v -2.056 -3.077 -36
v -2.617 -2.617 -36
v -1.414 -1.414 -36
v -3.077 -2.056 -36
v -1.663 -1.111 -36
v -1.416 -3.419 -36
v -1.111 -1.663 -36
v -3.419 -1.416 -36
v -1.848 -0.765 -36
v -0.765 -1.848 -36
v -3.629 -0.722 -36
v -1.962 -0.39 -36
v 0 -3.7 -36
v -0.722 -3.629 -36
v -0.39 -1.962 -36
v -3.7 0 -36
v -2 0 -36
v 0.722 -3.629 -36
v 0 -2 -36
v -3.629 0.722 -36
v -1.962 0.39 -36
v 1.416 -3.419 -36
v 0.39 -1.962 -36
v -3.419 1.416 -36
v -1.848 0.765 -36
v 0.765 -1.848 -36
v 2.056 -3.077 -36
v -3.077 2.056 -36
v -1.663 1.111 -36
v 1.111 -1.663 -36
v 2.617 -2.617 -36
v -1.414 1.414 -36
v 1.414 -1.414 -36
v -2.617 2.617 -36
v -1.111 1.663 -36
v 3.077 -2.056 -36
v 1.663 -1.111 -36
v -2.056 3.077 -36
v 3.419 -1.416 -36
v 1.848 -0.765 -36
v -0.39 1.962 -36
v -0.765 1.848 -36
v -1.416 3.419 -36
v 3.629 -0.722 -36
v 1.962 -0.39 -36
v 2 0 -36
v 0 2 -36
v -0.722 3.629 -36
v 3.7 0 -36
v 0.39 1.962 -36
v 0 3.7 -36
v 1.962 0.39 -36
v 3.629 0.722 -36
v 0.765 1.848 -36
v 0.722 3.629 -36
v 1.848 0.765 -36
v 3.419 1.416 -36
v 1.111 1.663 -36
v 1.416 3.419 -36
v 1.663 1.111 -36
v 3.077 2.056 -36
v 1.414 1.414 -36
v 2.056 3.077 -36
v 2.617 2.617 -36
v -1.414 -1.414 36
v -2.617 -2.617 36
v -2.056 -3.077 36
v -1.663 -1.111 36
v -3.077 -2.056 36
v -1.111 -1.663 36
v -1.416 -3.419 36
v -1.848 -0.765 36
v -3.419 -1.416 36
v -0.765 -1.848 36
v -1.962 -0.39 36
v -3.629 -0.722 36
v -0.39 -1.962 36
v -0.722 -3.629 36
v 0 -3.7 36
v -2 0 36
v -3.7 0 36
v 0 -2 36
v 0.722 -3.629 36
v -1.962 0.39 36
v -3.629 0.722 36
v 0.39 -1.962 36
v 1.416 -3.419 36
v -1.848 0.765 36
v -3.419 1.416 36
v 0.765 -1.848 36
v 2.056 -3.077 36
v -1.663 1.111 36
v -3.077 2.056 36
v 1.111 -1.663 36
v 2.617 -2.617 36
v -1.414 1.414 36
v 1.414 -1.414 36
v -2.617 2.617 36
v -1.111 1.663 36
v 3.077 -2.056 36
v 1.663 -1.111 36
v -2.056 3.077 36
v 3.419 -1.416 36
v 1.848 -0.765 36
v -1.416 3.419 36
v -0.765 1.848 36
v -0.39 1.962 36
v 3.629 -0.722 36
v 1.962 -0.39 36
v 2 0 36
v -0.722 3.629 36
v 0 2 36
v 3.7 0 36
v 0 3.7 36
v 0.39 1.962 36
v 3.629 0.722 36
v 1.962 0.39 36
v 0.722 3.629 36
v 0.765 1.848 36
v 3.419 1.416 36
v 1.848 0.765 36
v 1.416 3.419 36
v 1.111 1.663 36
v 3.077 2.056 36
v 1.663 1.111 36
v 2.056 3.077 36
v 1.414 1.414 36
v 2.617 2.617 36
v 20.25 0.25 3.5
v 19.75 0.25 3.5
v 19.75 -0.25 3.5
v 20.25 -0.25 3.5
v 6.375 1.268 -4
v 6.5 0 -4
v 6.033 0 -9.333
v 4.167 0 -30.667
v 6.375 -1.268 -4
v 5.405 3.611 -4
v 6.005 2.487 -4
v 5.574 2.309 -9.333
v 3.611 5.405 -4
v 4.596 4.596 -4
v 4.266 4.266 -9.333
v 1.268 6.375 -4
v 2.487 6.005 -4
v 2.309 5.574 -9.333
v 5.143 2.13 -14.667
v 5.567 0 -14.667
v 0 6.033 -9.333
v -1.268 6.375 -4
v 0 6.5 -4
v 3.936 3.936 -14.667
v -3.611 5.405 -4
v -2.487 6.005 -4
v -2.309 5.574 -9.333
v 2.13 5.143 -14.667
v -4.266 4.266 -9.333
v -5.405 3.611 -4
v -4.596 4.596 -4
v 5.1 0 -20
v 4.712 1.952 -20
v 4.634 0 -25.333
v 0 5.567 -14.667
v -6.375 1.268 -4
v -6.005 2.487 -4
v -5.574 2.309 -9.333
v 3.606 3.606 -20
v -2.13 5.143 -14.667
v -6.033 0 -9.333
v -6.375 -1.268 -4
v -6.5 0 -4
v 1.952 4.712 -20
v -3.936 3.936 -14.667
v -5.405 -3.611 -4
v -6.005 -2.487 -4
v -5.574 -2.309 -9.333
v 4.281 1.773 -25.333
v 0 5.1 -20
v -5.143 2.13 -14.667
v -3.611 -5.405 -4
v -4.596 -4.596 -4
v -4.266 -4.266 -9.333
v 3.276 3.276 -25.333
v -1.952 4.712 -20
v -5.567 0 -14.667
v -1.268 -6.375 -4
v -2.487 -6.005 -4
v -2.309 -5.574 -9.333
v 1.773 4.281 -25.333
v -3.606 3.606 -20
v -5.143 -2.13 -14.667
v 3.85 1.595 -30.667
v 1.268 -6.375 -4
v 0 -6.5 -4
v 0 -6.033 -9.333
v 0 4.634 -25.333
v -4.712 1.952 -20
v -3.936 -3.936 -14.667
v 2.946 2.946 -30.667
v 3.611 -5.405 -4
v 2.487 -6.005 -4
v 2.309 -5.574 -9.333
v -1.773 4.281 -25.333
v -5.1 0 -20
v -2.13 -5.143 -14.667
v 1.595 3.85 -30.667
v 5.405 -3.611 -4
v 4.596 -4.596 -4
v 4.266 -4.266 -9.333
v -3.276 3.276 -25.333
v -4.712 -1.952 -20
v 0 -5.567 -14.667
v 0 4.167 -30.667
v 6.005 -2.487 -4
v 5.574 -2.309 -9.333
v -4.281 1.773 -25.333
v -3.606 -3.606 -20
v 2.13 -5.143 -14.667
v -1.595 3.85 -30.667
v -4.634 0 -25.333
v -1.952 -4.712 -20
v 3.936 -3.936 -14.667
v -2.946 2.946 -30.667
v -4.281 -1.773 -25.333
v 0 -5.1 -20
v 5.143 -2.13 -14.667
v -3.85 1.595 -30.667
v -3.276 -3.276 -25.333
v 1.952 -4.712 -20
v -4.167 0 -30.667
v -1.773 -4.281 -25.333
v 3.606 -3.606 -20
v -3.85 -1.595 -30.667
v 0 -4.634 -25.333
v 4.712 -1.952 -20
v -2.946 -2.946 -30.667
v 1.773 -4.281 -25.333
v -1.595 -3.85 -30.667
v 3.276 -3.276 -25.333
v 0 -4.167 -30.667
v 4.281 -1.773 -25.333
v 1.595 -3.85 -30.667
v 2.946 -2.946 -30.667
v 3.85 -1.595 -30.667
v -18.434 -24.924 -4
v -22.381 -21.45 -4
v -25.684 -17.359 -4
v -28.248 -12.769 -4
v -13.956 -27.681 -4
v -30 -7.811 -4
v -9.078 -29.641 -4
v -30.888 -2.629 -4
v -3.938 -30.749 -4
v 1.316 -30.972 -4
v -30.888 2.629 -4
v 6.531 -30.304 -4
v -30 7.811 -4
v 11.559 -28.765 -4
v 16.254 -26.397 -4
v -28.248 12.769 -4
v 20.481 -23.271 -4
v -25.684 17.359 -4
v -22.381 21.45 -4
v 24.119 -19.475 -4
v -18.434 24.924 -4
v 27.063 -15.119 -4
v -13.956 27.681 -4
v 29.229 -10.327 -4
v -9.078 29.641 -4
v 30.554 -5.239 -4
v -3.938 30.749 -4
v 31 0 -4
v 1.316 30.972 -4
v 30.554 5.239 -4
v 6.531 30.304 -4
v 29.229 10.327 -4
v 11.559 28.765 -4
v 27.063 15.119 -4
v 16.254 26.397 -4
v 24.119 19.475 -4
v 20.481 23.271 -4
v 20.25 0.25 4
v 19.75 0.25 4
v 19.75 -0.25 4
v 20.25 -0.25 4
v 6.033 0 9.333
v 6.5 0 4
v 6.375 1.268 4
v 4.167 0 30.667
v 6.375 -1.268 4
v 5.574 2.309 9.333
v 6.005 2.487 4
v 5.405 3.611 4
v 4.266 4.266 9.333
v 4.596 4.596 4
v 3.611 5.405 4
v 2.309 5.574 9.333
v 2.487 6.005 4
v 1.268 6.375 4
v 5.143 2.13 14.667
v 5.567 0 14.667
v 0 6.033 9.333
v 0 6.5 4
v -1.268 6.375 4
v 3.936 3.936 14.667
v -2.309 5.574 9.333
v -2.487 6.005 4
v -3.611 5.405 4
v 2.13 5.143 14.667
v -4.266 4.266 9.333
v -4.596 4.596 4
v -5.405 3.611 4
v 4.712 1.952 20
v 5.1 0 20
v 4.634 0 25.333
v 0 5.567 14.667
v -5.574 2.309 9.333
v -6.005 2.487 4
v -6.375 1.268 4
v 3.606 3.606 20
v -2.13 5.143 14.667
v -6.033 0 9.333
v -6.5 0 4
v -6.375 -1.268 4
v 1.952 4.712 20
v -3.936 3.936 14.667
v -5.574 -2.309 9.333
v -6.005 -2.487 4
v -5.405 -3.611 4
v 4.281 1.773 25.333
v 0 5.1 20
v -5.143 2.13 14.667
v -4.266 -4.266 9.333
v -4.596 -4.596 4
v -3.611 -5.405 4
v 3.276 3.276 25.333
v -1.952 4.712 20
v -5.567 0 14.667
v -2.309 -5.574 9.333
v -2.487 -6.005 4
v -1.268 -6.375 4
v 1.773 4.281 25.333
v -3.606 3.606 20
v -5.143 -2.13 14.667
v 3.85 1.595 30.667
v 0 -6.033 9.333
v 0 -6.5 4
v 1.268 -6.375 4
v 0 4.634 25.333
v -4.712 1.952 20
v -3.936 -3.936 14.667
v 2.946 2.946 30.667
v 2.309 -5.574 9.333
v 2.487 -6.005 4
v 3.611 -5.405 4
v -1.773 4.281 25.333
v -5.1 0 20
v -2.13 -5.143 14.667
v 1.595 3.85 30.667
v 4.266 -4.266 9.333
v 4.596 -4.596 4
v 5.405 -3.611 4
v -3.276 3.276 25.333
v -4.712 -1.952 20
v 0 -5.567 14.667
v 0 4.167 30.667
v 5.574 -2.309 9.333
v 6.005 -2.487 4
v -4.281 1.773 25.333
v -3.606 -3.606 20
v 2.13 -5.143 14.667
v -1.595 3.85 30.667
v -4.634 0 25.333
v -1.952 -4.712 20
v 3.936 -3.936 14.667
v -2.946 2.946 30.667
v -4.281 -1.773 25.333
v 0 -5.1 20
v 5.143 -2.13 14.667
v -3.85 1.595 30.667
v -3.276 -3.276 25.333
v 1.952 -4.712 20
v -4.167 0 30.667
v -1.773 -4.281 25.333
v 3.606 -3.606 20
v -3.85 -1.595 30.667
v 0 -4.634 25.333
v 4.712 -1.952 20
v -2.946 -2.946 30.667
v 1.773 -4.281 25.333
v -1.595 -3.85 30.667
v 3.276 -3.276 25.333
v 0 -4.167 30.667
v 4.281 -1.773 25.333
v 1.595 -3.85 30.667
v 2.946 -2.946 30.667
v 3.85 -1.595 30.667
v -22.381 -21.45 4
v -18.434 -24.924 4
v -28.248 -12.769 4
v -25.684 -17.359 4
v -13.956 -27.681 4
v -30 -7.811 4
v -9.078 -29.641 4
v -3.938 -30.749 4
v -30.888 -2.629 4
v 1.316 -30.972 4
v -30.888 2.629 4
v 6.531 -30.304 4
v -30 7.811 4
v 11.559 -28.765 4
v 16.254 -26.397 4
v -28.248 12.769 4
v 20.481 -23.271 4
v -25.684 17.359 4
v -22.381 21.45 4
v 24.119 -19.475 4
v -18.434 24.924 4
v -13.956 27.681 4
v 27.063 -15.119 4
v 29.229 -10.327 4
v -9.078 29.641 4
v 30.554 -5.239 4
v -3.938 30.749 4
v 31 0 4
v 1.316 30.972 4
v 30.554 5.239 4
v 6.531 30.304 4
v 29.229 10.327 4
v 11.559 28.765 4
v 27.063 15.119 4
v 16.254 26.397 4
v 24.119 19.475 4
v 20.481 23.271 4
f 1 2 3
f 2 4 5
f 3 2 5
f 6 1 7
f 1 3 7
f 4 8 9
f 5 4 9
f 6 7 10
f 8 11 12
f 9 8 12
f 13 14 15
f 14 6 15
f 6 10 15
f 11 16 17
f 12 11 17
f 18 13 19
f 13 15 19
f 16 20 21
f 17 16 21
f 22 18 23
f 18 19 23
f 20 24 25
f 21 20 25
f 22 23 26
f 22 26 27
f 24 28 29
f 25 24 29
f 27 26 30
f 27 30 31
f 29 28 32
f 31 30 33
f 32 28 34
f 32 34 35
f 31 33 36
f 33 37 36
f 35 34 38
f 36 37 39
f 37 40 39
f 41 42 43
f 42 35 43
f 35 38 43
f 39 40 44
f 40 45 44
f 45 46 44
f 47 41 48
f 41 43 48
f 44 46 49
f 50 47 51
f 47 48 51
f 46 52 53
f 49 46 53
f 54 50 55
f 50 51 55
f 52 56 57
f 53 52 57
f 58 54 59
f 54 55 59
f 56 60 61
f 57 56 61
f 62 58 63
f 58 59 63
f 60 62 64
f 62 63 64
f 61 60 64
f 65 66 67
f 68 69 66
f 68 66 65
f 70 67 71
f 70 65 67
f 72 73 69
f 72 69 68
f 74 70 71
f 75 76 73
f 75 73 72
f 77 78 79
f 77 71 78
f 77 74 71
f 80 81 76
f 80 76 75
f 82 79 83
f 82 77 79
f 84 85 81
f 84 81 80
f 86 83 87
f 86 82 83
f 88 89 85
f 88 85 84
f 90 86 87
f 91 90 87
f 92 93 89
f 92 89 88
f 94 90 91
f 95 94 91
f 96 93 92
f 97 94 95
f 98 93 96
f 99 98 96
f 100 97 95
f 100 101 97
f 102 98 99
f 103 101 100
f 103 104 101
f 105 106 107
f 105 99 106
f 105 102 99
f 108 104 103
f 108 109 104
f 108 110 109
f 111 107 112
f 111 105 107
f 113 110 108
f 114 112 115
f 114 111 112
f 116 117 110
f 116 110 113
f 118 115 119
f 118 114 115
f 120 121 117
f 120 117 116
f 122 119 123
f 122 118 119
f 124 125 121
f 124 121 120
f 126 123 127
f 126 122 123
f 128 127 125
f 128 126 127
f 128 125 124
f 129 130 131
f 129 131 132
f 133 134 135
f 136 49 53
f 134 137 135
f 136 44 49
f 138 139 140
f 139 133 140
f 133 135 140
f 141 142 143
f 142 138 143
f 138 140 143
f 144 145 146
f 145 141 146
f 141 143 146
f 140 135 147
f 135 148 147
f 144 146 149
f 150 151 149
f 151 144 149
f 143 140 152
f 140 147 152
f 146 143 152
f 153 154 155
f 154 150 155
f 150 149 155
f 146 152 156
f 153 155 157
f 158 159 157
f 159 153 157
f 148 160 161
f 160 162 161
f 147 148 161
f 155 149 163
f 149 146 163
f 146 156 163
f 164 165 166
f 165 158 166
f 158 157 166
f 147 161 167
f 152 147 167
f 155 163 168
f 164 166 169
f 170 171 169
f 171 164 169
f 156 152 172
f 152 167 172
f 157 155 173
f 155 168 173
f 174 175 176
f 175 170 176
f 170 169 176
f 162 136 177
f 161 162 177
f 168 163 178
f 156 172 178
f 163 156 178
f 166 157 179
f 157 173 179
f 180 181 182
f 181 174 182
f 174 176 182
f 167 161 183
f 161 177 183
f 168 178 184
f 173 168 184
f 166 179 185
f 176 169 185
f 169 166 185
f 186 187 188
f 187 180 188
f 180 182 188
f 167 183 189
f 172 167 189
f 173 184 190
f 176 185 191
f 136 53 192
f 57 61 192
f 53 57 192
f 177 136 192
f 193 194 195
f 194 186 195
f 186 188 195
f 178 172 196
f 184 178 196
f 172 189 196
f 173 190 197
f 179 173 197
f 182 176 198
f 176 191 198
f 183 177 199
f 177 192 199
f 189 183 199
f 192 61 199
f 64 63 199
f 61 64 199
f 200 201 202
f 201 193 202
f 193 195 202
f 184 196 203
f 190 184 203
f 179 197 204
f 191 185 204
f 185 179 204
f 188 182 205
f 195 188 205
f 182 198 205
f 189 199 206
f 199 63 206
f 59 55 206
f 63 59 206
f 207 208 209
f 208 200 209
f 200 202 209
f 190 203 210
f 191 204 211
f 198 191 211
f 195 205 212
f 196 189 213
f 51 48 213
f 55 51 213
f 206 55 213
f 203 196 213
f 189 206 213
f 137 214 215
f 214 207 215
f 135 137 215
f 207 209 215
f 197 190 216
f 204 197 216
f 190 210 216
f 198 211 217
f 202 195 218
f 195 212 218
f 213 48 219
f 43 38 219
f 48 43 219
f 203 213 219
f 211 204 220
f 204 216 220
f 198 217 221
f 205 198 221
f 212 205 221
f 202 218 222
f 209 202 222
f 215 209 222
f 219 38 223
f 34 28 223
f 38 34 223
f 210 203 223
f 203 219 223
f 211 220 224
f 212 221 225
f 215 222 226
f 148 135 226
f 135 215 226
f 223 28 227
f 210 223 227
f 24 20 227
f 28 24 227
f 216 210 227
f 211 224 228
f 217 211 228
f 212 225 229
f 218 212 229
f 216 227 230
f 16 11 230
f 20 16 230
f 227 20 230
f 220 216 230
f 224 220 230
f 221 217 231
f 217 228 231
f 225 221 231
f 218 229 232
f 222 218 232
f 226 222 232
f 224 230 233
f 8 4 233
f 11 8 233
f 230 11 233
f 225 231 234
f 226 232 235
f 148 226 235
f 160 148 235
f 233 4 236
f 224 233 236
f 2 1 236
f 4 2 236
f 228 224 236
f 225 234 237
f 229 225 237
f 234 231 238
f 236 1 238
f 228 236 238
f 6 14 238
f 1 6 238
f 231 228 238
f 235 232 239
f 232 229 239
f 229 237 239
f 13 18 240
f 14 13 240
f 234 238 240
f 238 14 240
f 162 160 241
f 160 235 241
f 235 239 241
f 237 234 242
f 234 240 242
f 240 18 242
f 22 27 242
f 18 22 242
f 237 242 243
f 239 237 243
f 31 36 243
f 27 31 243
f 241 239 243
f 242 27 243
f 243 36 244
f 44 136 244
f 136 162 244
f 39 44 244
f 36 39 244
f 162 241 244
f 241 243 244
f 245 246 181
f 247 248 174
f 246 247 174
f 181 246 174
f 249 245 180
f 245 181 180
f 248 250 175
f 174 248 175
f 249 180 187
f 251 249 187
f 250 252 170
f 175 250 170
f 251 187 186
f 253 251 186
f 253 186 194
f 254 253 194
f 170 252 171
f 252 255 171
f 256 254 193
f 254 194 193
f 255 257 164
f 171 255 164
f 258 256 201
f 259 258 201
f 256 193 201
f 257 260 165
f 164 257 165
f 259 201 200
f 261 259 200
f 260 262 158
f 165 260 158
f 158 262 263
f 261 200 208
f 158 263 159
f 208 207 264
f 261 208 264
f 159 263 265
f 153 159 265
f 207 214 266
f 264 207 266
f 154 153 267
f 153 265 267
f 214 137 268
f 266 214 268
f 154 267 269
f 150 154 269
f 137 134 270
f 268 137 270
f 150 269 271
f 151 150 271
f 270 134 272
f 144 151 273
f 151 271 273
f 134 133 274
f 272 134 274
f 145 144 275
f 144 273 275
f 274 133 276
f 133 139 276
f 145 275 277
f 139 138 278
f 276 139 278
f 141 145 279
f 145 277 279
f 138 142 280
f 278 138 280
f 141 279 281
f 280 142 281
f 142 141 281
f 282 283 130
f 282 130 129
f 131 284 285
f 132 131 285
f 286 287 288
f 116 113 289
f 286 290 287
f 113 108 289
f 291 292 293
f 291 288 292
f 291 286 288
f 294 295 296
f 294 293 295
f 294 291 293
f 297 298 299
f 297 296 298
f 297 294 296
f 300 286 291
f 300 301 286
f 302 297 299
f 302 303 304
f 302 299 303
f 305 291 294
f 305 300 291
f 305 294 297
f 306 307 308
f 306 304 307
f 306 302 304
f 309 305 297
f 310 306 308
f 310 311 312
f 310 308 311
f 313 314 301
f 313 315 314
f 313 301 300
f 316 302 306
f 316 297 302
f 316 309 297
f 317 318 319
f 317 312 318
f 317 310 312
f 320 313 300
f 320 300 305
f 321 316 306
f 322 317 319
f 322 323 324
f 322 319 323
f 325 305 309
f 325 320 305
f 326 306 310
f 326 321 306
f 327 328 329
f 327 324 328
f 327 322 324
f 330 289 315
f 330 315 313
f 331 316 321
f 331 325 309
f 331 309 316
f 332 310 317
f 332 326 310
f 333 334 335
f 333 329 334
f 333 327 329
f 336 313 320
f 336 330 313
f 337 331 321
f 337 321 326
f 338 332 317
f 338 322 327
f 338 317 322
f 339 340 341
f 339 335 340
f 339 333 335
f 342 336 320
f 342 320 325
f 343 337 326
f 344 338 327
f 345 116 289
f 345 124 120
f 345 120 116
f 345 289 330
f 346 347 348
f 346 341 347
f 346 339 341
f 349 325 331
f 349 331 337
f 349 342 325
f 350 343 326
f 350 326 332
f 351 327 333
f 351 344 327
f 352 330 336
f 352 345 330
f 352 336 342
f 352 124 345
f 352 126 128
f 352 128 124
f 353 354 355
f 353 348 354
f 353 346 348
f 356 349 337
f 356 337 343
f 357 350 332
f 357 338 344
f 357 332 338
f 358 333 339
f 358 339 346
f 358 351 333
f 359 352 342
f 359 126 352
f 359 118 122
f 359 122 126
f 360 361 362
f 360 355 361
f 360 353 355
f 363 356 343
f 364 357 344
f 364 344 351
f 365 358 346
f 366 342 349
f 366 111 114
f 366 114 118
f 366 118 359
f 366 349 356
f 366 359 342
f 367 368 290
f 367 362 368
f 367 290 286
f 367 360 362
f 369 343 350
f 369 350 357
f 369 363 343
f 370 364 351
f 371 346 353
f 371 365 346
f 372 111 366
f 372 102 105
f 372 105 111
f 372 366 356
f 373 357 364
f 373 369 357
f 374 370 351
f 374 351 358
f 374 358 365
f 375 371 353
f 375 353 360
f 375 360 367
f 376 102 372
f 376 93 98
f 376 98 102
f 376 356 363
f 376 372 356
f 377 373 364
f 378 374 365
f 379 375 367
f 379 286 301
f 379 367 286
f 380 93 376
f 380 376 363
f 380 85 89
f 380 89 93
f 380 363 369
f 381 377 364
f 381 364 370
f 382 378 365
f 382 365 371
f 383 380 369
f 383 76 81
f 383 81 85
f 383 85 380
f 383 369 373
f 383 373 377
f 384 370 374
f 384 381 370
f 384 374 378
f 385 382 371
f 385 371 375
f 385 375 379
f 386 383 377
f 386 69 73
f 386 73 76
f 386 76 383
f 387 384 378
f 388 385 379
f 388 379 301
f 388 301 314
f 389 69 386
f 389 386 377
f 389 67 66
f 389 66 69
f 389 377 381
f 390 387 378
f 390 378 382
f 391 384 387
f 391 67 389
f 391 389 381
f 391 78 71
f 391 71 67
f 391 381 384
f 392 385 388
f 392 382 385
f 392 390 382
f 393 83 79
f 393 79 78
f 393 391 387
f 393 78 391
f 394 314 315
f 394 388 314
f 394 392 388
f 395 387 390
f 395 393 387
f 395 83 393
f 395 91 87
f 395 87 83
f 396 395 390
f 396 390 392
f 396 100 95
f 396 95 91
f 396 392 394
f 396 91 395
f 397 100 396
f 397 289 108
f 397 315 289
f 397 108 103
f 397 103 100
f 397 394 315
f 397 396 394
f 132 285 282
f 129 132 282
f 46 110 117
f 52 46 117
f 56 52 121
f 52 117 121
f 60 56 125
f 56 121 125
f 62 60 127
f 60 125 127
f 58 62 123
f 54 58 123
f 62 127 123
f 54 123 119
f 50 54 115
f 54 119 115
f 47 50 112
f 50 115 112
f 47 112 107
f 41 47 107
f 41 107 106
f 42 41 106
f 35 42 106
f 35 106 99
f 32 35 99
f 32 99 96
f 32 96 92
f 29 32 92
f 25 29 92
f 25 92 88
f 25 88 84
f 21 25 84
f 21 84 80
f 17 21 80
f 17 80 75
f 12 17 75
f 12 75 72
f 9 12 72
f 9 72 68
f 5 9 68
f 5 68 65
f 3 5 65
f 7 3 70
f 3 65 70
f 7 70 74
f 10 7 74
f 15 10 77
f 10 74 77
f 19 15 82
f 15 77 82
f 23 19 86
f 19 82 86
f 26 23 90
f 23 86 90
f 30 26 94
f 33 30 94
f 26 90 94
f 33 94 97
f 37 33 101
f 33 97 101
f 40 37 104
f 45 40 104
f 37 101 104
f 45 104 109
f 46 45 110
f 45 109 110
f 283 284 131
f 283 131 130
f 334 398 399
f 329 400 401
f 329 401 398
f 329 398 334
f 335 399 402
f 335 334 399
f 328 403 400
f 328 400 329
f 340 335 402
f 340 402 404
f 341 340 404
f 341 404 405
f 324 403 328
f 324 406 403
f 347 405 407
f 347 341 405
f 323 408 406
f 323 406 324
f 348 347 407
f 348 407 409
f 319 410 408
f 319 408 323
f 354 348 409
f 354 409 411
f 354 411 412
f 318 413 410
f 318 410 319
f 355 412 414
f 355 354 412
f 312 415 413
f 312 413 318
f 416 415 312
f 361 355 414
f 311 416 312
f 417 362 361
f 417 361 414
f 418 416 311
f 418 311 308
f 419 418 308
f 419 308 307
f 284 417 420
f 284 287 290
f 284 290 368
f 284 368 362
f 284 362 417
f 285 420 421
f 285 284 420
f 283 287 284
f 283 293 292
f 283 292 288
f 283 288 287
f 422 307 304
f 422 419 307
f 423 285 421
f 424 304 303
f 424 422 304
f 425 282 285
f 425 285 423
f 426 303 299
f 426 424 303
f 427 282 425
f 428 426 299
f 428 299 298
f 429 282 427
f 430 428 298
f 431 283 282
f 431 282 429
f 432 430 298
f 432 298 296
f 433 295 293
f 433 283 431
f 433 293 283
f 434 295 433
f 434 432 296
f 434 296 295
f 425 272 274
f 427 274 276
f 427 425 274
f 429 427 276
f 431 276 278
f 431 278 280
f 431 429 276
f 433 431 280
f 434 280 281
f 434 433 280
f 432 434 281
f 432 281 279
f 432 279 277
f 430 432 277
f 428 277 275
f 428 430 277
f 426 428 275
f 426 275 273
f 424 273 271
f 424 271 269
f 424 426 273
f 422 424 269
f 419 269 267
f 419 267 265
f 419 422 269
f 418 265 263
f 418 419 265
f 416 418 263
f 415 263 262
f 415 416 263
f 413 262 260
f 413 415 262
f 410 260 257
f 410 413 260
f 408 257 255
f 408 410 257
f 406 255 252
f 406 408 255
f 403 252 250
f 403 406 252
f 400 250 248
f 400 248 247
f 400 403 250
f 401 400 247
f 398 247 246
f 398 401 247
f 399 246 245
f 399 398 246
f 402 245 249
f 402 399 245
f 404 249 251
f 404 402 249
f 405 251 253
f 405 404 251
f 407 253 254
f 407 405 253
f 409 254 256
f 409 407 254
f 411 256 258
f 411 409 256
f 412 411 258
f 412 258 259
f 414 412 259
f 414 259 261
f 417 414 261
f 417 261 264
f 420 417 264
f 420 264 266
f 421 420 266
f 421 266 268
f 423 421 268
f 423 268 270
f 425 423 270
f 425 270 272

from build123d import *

# Parameters (mm, degrees)
SKETCH1_R           = 31
BOSS_EXTRUDE1_DEPTH = 4
SKETCH3_R           = 6.5
BOSS_EXTRUDE2_DEPTH = 32
BOSS_EXTRUDE2_TAPER = 5
SKETCH4_R           = 2
CUT_EXTRUDE1_DEPTH  = 85.297093663
SKETCH5_W           = 0.5
SKETCH5_H           = 0.5
CUT_EXTRUDE2_DEPTH  = 0.5


with BuildPart() as part:
    # Sketch1 → Boss-Extrude1 (new, symmetric)
    with BuildSketch(Plane.XY):
        Circle(SKETCH1_R)
    extrude(amount=BOSS_EXTRUDE1_DEPTH, both=True)

    # Sketch3 → Boss-Extrude2 (add)
    with BuildSketch(Plane.XY.offset(4)):
        Circle(SKETCH3_R)
    boss_extrude2 = extrude(amount=BOSS_EXTRUDE2_DEPTH, taper=BOSS_EXTRUDE2_TAPER)

    # Mirror1: Boss-Extrude2 across plane
    add(boss_extrude2.mirror(Plane.XY))

    # Sketch4 → Cut-Extrude1 (cut, through all)
    with BuildSketch(Plane.XY.offset(36)):
        Circle(SKETCH4_R)
    extrude(amount=-CUT_EXTRUDE1_DEPTH, mode=Mode.SUBTRACT)

    # Sketch5 → Cut-Extrude2 (cut)
    with BuildSketch(Plane.XY.offset(4)):
        with Locations((20, 0)):
            Rectangle(SKETCH5_W, SKETCH5_H)
    extrude(amount=-CUT_EXTRUDE2_DEPTH, mode=Mode.SUBTRACT)


solid = part.part
